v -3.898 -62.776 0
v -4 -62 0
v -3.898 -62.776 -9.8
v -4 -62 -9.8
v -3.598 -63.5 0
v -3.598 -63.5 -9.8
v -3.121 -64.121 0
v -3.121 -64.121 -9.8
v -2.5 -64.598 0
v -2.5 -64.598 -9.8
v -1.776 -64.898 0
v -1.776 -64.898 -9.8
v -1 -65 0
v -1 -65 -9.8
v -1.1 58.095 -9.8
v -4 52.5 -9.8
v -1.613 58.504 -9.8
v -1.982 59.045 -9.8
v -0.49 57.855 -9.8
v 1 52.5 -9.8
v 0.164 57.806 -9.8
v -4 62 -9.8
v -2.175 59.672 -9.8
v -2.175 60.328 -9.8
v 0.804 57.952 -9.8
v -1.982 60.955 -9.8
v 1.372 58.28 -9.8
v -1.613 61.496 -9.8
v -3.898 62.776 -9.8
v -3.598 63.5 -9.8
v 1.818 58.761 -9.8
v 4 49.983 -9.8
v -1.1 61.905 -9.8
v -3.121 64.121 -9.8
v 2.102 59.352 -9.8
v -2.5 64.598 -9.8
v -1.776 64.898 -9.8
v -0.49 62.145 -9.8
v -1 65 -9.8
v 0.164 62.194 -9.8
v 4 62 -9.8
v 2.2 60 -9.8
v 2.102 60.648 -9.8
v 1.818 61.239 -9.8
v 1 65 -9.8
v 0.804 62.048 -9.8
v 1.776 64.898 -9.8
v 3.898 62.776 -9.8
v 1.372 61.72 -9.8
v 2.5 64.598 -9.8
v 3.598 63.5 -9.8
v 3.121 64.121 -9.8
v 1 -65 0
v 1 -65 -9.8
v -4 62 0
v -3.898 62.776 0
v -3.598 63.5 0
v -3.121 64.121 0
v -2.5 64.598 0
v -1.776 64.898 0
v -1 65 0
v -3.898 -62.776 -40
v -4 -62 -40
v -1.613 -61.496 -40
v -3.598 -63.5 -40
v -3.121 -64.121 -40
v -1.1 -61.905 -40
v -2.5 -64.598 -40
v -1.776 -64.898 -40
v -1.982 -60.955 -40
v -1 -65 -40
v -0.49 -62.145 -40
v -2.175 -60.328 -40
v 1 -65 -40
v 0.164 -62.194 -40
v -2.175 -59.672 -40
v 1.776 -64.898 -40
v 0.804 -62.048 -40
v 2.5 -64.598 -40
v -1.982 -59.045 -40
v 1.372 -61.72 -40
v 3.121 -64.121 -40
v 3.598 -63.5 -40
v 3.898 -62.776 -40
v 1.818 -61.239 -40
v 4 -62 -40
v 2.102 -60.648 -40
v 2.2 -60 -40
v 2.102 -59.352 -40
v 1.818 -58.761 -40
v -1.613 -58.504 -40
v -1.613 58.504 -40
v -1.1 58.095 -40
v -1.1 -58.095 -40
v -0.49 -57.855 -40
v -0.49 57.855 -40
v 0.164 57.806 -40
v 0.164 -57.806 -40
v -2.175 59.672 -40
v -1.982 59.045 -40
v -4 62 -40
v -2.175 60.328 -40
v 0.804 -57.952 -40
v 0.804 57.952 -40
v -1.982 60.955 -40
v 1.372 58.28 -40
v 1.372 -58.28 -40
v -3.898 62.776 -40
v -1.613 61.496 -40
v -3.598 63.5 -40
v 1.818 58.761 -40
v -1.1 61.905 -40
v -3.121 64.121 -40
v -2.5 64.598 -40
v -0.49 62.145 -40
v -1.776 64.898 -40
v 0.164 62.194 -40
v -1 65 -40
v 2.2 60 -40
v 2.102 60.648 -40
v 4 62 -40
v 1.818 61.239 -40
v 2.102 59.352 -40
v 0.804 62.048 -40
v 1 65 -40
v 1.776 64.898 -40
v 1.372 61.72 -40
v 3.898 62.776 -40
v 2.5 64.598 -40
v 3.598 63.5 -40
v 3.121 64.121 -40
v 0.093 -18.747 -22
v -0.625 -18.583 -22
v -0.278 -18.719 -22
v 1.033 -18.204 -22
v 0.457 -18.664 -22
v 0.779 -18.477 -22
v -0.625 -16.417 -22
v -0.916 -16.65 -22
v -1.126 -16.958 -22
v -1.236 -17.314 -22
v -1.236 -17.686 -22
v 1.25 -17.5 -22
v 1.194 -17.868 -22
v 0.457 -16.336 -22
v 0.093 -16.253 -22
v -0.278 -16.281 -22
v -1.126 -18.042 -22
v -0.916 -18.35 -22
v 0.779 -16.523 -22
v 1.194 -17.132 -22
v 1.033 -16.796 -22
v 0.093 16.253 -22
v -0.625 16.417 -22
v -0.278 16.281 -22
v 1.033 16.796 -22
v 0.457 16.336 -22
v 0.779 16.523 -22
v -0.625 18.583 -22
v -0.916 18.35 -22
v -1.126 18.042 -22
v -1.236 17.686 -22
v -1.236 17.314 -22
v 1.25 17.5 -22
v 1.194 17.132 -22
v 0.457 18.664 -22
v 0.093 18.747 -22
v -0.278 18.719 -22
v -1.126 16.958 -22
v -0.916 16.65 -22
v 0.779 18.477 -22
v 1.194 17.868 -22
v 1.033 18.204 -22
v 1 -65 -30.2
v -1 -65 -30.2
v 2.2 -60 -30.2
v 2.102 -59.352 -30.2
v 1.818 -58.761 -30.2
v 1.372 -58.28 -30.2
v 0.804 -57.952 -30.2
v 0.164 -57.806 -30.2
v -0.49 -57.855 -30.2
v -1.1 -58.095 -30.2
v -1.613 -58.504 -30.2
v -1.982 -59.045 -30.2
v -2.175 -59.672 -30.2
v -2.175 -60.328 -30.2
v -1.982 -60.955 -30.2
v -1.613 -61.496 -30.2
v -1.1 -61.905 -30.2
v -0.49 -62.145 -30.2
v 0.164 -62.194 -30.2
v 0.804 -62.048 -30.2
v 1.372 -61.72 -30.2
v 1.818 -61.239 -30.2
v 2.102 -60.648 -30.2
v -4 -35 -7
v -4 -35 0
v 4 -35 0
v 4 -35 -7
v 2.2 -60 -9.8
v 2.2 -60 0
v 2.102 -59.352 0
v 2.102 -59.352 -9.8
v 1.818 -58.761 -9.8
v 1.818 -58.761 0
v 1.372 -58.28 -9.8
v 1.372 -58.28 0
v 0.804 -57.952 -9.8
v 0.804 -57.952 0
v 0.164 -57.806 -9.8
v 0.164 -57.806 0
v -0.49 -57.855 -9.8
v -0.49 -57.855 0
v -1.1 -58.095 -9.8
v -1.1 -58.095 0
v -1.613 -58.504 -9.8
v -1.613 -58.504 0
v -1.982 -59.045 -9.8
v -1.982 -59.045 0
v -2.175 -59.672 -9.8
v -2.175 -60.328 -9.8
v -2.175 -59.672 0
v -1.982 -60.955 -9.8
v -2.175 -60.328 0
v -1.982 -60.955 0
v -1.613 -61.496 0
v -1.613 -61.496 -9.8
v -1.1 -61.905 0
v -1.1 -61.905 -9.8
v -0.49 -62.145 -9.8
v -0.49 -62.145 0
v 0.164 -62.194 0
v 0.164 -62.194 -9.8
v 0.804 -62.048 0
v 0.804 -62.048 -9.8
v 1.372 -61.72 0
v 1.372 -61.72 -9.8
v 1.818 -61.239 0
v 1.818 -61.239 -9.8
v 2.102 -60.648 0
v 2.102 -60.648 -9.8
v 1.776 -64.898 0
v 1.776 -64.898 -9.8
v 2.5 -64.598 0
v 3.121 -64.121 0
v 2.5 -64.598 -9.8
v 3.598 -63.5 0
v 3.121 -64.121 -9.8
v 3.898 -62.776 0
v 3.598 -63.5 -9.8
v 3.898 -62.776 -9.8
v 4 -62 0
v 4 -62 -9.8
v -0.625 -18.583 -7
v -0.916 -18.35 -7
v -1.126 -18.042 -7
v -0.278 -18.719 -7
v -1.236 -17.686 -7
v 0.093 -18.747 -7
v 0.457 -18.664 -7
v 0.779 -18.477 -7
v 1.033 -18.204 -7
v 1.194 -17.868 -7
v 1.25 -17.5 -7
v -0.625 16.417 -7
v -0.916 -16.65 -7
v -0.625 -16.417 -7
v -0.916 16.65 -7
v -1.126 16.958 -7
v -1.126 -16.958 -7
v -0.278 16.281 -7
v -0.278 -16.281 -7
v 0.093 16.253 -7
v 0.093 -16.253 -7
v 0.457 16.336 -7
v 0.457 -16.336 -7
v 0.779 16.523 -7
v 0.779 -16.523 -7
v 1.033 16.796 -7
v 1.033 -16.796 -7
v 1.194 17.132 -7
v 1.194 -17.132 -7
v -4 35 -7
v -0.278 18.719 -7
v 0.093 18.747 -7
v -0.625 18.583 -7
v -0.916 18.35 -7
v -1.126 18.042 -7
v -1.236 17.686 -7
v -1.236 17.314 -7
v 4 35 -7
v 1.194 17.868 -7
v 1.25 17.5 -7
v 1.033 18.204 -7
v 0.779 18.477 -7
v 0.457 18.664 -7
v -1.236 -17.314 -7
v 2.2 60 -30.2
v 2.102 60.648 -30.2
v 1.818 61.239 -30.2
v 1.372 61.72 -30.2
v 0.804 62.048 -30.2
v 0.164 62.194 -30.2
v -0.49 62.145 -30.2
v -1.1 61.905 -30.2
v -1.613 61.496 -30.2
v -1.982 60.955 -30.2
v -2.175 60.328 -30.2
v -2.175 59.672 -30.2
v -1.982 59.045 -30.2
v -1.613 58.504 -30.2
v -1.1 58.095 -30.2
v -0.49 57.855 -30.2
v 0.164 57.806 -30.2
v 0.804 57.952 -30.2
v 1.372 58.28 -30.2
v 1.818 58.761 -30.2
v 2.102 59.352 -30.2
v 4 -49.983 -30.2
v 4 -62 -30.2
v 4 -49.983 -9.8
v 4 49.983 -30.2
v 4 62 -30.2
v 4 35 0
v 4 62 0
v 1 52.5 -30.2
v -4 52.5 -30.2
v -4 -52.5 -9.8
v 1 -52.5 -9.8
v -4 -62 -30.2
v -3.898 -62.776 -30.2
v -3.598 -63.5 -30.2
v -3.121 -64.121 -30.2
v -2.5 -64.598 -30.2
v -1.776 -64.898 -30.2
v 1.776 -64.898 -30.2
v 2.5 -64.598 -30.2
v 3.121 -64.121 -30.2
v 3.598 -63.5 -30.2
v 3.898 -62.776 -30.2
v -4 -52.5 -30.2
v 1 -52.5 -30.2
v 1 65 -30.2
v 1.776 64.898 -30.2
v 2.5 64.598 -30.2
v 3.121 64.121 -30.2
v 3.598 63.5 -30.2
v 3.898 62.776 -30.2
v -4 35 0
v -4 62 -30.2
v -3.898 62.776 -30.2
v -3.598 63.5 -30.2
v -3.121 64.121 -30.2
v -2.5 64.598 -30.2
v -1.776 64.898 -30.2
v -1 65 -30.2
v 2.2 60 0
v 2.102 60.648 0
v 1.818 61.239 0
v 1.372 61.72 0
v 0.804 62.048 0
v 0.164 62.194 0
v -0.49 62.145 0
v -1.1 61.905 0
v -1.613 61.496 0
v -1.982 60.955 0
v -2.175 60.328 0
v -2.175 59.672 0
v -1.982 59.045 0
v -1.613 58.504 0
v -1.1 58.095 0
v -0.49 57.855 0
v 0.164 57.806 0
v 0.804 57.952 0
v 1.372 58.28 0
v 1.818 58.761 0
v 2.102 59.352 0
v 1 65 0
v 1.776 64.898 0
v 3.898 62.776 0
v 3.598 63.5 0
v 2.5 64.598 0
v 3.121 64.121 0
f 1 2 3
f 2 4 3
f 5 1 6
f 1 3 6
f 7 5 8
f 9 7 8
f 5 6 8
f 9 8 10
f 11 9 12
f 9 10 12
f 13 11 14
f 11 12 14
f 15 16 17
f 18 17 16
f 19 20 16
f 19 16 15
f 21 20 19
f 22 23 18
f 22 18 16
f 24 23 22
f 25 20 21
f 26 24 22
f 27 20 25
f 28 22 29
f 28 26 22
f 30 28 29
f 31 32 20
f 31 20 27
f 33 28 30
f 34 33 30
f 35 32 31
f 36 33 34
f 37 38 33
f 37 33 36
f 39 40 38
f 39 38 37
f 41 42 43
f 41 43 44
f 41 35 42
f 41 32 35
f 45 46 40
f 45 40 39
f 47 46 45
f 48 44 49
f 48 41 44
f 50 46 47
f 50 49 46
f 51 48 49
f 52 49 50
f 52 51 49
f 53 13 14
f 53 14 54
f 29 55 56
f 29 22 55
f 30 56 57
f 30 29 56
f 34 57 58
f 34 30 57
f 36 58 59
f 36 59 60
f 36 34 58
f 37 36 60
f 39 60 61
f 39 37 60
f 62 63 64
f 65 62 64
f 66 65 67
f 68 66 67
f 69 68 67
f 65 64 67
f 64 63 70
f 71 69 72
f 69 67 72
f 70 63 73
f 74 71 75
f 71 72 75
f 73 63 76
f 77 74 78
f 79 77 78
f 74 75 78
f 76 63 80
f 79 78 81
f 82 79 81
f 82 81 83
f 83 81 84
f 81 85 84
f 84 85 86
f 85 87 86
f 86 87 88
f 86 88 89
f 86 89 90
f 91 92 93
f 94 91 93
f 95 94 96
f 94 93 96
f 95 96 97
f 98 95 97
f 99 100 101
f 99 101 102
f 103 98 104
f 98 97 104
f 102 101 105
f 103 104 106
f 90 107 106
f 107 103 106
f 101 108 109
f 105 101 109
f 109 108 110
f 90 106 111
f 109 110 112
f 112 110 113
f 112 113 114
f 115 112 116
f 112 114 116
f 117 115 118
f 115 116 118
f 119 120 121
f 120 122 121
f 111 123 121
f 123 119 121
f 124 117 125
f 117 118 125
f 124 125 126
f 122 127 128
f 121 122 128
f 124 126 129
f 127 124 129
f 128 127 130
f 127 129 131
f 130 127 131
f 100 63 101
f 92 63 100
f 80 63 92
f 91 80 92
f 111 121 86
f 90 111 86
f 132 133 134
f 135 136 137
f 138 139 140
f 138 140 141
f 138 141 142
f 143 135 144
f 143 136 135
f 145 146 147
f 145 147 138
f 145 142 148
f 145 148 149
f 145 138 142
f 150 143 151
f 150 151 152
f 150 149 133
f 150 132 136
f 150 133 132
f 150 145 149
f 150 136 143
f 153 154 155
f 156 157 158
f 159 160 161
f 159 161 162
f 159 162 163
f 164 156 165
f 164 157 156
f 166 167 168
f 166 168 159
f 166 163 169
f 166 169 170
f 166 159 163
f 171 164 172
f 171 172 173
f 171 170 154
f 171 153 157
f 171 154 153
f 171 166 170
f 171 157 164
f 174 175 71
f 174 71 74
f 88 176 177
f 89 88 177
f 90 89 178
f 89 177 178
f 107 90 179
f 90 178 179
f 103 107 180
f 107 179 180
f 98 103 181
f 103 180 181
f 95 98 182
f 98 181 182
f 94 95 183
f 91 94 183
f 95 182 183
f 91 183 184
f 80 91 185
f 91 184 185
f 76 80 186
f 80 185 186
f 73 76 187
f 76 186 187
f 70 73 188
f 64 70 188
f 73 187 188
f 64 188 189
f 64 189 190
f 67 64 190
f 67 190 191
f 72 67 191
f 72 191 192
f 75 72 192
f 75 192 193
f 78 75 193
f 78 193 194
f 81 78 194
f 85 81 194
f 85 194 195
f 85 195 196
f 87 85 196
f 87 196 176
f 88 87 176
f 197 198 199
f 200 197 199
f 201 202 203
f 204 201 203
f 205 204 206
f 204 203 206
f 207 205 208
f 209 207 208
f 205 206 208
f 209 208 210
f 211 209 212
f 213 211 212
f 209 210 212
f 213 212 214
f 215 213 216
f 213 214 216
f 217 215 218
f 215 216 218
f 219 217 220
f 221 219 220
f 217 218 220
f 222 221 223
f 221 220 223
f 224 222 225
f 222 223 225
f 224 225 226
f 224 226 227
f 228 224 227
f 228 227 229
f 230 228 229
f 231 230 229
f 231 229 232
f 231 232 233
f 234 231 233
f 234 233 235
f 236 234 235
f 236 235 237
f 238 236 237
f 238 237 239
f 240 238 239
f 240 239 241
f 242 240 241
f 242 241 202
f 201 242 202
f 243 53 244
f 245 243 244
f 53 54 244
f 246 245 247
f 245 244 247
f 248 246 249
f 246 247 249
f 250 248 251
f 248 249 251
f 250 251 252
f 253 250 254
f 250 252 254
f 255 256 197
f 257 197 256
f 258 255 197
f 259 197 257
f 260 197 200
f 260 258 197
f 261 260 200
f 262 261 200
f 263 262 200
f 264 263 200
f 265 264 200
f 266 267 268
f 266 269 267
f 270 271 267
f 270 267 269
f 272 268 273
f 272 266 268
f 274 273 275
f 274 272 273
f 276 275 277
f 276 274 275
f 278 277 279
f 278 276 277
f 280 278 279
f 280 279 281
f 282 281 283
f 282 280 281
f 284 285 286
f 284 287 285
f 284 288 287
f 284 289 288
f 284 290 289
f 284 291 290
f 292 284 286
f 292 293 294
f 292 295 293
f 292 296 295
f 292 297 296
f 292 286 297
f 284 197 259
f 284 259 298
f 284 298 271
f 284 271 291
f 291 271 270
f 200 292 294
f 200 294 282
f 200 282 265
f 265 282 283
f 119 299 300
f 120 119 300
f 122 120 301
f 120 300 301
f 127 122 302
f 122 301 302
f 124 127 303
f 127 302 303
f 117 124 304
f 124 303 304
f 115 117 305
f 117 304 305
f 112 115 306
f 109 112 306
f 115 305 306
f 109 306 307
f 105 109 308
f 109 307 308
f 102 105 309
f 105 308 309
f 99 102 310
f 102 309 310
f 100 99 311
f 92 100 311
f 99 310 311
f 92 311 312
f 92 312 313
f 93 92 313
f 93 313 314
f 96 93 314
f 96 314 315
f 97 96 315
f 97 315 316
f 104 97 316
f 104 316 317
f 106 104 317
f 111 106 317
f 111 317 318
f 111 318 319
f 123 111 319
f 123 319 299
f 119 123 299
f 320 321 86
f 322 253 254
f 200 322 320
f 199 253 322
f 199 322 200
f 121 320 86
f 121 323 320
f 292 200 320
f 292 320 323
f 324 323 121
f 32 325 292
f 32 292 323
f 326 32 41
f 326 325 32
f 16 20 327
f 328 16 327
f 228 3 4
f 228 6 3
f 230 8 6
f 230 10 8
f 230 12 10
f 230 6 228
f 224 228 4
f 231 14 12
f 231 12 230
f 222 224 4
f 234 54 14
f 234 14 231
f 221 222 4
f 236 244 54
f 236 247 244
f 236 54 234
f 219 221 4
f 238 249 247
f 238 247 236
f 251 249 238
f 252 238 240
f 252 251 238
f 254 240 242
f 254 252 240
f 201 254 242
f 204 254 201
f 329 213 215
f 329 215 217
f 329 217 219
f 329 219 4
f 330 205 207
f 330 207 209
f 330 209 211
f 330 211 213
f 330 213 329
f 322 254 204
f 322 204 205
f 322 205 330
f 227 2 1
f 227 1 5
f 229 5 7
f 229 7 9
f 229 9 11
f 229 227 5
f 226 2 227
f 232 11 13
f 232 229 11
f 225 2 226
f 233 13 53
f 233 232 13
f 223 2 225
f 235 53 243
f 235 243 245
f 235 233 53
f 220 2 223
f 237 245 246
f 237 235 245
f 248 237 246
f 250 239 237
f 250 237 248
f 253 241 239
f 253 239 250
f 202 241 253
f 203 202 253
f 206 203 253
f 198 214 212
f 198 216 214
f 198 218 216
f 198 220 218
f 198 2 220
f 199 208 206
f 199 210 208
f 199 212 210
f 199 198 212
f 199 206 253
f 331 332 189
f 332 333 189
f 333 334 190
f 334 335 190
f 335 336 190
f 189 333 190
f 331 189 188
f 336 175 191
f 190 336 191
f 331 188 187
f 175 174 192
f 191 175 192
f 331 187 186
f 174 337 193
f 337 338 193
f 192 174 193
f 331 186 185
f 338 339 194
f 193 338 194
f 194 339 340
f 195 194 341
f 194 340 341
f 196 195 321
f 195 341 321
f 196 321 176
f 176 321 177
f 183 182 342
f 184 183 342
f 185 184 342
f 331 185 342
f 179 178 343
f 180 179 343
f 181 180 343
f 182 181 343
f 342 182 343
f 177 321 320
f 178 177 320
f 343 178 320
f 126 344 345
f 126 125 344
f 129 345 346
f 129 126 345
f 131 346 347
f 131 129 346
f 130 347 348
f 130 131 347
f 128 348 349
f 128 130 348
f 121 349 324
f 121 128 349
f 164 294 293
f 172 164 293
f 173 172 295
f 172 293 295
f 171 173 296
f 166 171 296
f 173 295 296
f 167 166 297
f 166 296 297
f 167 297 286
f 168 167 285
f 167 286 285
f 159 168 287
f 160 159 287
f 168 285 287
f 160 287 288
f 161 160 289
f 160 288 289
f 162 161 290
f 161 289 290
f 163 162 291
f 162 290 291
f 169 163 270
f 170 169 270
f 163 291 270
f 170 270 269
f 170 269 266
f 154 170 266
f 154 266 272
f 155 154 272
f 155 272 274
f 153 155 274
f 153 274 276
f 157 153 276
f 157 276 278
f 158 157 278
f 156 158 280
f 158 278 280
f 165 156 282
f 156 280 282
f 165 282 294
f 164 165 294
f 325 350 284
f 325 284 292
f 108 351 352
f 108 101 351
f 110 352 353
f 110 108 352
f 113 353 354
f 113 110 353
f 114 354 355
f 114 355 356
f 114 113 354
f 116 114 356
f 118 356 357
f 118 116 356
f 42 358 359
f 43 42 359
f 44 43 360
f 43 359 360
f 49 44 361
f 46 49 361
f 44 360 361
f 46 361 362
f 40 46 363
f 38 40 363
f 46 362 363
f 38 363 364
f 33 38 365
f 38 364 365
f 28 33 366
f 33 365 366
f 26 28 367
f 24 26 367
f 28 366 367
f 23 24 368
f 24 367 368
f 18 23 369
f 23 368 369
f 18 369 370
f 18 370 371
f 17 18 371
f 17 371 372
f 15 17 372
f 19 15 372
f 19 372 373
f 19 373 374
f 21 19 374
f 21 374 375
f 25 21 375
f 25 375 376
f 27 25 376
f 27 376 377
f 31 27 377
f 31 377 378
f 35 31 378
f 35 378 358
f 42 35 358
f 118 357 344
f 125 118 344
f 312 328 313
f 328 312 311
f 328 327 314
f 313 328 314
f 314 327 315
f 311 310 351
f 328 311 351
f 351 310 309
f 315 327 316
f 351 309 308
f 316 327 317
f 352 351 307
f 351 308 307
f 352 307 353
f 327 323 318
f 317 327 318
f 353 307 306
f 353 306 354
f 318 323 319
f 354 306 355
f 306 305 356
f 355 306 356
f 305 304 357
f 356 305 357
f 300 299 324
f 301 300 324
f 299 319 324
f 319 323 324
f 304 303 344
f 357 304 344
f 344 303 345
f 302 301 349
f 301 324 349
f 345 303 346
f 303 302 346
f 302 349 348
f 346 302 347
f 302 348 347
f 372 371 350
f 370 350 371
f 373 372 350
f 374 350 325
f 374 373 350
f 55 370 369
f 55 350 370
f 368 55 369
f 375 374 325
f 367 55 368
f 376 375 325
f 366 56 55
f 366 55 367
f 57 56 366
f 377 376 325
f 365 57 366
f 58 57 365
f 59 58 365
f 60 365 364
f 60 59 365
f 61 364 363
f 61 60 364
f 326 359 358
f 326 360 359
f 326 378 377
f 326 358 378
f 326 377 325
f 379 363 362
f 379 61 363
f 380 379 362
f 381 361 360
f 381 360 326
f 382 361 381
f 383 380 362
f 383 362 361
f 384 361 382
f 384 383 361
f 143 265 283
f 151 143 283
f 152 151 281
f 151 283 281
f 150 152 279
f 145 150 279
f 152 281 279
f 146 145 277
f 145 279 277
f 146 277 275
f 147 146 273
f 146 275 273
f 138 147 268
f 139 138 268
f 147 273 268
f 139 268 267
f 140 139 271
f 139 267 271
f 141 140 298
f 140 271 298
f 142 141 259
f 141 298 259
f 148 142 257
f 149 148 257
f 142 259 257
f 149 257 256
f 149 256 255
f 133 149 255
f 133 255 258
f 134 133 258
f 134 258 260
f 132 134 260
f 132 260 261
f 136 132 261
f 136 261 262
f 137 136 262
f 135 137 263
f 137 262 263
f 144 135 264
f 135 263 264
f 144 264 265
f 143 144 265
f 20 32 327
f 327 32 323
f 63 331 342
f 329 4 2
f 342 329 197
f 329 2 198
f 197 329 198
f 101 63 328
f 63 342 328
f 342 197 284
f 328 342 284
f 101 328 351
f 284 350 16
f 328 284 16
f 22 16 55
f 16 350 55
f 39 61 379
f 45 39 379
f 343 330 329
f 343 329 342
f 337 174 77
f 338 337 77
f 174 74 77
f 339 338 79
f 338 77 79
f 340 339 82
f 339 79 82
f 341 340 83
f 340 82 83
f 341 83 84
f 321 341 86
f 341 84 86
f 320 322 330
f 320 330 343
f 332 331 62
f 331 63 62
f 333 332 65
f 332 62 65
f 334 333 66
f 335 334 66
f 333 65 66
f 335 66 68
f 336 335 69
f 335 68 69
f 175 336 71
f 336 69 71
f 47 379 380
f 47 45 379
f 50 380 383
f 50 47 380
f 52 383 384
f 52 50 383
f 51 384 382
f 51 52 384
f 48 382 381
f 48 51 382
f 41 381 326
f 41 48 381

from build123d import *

# Parameters (mm, degrees)
SKETCH1_W             = 8
SKETCH1_H             = 130
BOSS_EXTRUDE1_DEPTH   = 40
SKETCH2_W             = 20.4
SKETCH2_H             = 25
CUT_EXTRUDE1_DEPTH    = 9
FILLET1_R             = 3
SKETCH3_R             = 2.2
CUT_EXTRUDE2_DEPTH    = 41
SKETCH4_W             = 56.10425639
SKETCH4_H             = 70
CUT_EXTRUDE3_DEPTH    = 7
SKETCH5_R             = 1.25
CUT_EXTRUDE4_DEPTH    = 15
CHAMFER1_SIZE         = 3
CHAMFER1_SIZE2        = 2.517298894
CHAMFER1_PART_2_SIZE  = 3
CHAMFER1_PART_2_SIZE2 = 2.517298894


with BuildPart() as part:
    # Sketch1 → Boss-Extrude1 (new body)
    with BuildSketch(Plane.XY):
        Rectangle(SKETCH1_W, SKETCH1_H)
    extrude(amount=-BOSS_EXTRUDE1_DEPTH)

    # Sketch2 → Cut-Extrude1 (cut, through all)
    with BuildSketch(Plane(origin=(4, 0, 0), x_dir=(0, 0, -1), z_dir=(1, 0, 0))):
        with Locations((20, 65)):
            Rectangle(SKETCH2_W, SKETCH2_H)
        with Locations((20, -65)):
            Rectangle(SKETCH2_W, SKETCH2_H)
    extrude(amount=-CUT_EXTRUDE1_DEPTH, mode=Mode.SUBTRACT)

    # Fillet1
    fillet1_edges = [part.edges().sort_by_distance(p)[0] for p in [
        (4, 65, -4.9),
        (-4, 65, -4.9),
        (-4, -65, -4.9),
        (4, -65, -4.9),
        (4, -65, -35.1),
        (-4, -65, -35.1),
        (-4, 65, -35.1),
        (4, 65, -35.1),
    ]]
    fillet(fillet1_edges, radius=FILLET1_R)

    # Sketch3 → Cut-Extrude2 (cut, through all)
    with BuildSketch(Plane.XY):
        with Locations((0, 60)):
            Circle(SKETCH3_R)
        with Locations((0, -60)):
            Circle(SKETCH3_R)
    extrude(amount=-CUT_EXTRUDE2_DEPTH, mode=Mode.SUBTRACT)

    # Sketch4 → Cut-Extrude3 (cut)
    with BuildSketch(Plane.XY):
        Rectangle(SKETCH4_W, SKETCH4_H)
    extrude(amount=-CUT_EXTRUDE3_DEPTH, mode=Mode.SUBTRACT)

    # Sketch5 → Cut-Extrude4 (cut)
    with BuildSketch(Plane.XY.offset(-7)):
        with Locations((0, 17.5)):
            Circle(SKETCH5_R)
        with Locations((0, -17.5)):
            Circle(SKETCH5_R)
    extrude(amount=-CUT_EXTRUDE4_DEPTH, mode=Mode.SUBTRACT)

    # Chamfer1
    chamfer1_edges = [part.edges().sort_by_distance(p)[0] for p in [
        (4, 52.5, -20),
    ]]
    chamfer1_side = [part.faces().sort_by_distance(p)[0] for p in [
        (0, 52.5, -20),
    ]]
    chamfer(chamfer1_edges, length=CHAMFER1_SIZE, length2=CHAMFER1_SIZE2, reference=chamfer1_side[0])

    # Chamfer1 part 2
    chamfer1_part_2_edges = [part.edges().sort_by_distance(p)[0] for p in [
        (4, -52.5, -20),
    ]]
    chamfer1_part_2_side = [part.faces().sort_by_distance(p)[0] for p in [
        (0, -52.5, -20),
    ]]
    chamfer(chamfer1_part_2_edges, length=CHAMFER1_PART_2_SIZE, length2=CHAMFER1_PART_2_SIZE2, reference=chamfer1_part_2_side[0])


solid = part.part
